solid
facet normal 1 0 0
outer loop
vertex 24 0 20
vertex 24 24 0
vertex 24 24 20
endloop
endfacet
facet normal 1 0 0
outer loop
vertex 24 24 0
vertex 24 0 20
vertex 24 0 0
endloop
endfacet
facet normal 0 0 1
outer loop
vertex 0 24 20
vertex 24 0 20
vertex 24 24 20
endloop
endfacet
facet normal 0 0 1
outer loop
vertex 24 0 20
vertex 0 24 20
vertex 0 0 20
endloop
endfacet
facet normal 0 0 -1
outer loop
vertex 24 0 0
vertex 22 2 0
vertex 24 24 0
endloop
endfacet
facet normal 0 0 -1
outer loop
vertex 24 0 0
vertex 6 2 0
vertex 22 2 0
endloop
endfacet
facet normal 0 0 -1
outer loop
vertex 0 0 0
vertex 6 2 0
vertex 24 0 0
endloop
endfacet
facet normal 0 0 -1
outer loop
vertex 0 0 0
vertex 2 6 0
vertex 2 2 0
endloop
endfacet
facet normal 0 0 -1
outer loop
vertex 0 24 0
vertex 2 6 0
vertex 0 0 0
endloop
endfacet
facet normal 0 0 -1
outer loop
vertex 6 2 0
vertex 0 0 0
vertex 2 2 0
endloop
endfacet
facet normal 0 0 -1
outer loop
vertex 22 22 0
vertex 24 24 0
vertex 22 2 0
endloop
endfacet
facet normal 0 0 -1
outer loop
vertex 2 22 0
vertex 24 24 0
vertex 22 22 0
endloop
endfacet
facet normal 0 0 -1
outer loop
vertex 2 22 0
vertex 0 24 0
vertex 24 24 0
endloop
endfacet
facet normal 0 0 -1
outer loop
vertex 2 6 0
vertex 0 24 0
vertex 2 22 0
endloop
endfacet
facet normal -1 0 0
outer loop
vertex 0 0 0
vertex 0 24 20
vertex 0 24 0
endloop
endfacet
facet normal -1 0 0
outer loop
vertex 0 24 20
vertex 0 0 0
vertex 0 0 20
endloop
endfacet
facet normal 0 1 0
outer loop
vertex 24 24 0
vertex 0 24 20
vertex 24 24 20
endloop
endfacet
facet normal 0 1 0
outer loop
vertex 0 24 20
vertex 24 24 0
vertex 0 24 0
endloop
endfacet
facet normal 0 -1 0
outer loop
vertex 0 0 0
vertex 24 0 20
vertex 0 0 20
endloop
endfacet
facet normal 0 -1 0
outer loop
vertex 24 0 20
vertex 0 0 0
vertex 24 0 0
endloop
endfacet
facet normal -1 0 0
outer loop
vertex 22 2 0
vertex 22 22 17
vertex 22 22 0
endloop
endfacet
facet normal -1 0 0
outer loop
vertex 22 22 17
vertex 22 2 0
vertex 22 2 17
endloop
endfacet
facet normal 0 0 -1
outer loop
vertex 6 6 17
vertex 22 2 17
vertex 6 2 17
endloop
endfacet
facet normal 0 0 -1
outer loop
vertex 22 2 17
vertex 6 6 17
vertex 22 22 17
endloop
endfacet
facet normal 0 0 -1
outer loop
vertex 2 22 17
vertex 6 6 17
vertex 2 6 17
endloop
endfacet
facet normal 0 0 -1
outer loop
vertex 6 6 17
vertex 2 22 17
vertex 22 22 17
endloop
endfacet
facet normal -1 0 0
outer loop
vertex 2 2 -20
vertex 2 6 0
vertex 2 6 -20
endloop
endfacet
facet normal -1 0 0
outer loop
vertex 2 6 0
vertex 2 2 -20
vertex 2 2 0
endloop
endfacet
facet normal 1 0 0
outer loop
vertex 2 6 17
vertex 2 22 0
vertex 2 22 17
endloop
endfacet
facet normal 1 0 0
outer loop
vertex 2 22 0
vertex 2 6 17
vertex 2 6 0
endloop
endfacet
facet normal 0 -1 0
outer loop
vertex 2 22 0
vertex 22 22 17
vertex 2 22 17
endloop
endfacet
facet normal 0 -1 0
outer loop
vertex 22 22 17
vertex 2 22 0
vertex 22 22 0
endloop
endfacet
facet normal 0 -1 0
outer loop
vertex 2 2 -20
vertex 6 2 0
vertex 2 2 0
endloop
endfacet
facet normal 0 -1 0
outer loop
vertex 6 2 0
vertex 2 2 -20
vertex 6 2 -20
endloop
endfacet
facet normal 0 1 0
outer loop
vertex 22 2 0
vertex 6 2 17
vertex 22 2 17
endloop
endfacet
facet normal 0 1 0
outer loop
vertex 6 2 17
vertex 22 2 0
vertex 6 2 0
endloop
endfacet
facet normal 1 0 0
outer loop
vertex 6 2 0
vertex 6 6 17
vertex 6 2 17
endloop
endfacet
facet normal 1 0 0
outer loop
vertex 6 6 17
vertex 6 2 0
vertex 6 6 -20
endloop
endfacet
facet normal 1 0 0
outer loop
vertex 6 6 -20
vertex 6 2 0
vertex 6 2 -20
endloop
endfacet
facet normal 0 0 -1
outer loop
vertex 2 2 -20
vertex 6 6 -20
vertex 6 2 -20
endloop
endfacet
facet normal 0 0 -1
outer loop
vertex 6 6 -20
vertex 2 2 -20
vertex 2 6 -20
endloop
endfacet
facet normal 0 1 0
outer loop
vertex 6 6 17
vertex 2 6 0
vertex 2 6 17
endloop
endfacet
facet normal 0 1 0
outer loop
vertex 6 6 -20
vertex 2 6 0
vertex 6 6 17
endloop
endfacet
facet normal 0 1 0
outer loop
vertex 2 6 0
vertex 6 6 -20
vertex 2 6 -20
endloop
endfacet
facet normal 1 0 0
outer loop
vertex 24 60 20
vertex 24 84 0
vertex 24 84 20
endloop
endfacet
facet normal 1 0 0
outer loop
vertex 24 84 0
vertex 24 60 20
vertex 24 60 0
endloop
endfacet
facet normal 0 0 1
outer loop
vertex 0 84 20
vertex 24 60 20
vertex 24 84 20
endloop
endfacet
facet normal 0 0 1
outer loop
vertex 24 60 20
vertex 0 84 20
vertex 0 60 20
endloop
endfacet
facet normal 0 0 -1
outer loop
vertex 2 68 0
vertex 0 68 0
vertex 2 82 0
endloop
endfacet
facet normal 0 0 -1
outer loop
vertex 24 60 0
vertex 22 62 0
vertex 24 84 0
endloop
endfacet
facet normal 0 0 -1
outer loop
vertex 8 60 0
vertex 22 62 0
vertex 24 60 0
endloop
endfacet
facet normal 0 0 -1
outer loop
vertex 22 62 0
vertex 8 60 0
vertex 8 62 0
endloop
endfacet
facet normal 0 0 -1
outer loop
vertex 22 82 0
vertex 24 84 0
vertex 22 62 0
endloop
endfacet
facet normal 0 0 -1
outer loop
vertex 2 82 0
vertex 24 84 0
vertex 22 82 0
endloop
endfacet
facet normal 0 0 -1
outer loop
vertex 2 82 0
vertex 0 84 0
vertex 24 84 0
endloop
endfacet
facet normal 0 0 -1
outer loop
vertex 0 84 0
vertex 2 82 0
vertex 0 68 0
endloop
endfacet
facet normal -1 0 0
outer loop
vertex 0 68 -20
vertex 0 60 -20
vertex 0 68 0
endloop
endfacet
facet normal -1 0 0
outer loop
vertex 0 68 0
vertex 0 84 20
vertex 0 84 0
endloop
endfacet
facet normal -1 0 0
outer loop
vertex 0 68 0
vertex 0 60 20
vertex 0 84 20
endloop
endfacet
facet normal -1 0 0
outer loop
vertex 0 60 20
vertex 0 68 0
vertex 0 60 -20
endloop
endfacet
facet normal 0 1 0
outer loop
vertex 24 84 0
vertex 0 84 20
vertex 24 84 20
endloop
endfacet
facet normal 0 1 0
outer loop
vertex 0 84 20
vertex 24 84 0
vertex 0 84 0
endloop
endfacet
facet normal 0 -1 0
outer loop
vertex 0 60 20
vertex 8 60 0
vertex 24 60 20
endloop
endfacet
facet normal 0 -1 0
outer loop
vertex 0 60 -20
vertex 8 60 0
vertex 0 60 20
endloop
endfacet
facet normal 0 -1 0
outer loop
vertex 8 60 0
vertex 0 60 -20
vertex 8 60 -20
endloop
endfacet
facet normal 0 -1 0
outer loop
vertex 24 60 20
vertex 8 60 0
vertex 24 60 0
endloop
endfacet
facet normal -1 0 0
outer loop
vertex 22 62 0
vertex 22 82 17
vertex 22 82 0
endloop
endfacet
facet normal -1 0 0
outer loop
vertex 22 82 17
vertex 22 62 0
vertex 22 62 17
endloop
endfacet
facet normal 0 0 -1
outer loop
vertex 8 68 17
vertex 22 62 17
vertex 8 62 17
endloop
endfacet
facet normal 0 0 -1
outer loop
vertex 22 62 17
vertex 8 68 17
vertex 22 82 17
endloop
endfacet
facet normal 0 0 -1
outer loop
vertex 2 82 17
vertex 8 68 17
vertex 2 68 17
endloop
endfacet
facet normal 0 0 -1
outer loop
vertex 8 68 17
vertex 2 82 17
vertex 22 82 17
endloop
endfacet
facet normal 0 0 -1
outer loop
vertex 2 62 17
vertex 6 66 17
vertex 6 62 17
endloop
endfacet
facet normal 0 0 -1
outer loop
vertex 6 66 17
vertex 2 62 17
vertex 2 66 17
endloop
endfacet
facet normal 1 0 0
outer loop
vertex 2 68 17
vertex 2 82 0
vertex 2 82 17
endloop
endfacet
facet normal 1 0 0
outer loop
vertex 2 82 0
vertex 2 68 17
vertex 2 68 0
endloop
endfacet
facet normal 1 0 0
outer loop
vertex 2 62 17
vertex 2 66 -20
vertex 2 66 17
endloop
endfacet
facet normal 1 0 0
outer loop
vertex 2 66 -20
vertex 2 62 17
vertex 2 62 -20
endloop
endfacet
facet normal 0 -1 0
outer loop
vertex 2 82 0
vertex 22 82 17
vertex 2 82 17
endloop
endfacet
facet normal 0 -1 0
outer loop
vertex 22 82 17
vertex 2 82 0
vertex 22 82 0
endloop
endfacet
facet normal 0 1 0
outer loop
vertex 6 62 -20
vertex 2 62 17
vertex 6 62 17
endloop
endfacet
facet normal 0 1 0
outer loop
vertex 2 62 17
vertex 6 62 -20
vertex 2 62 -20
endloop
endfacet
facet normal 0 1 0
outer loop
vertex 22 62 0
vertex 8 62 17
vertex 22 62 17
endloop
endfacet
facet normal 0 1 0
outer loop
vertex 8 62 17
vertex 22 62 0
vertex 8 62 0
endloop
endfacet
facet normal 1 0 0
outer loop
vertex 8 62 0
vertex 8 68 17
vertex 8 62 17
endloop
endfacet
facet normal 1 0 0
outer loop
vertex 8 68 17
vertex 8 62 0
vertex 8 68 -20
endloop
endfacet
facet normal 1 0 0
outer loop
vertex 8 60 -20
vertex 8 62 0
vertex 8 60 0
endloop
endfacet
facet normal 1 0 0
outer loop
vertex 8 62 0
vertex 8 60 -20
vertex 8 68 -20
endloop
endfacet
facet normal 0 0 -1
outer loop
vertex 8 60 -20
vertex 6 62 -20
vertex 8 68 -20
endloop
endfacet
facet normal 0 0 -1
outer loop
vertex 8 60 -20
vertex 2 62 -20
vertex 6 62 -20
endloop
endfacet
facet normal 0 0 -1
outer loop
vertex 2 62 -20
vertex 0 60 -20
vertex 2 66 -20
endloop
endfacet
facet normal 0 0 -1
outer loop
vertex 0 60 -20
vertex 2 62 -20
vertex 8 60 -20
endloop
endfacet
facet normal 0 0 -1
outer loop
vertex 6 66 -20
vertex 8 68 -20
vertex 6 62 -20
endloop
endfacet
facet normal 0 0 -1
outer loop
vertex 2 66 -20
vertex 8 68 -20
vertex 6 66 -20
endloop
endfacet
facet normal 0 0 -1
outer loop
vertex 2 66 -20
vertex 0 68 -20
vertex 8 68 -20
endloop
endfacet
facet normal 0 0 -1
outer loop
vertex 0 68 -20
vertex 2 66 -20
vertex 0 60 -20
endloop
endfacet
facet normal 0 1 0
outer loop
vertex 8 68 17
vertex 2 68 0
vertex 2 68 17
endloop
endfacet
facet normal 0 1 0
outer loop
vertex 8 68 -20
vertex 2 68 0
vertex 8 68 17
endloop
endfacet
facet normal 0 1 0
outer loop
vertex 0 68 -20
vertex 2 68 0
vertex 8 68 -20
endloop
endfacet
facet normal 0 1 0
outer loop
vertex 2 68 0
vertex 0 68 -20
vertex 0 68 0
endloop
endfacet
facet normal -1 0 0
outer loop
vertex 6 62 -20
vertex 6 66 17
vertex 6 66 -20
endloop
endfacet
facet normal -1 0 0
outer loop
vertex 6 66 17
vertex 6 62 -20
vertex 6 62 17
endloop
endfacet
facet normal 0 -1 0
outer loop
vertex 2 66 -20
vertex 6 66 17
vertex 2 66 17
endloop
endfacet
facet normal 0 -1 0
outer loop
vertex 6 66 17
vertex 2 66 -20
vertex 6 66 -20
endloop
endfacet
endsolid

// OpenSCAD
outer_x = 24;
outer_y = 24;
inner_x = 20;
inner_y = 20;
outer_z = 20;

offset_x = (outer_x - inner_x) / 2;
offset_y = (outer_y - inner_y) / 2;
avg_offset = (offset_x + offset_y) / 2;

/*

*/

translate([0,0,0])
{
 rotate([0,0,0])
 {
  union()
  {
   difference(){
      cube([outer_x,outer_y,outer_z]){}
      translate([offset_x, offset_y, -1])
      {
       cube([inner_x,inner_y,outer_z - avg_offset]){}    
      }
   }
   translate([offset_x, offset_y, -outer_z]){
    cube([2*avg_offset, 2*avg_offset, outer_z * 2]){
    }
   }
  }
 }
}

/*
TODO: Add space for button
TODO: Add a locking mechanism in shaft using pinx
TODO: Add space for E14 fitting and cable 
*/

translate([0,60,0])
{
 rotate([0,0,0])
 {
  union()
  {
   difference(){
      cube([outer_x,outer_y,outer_z]){}
      translate([offset_x, offset_y, -1])
      {
       cube([inner_x,inner_y,outer_z - avg_offset]){}    
      }
   }
   difference(){
    translate([0, 0, -outer_z]){
     cube([4*avg_offset,4*avg_offset,2*outer_z]){}
    }
    translate([1*offset_x, 1*offset_y, -outer_z-1]){
     cube([2*avg_offset, 2*avg_offset, outer_z * 2]){}
    }
   }
  }
 }
}
